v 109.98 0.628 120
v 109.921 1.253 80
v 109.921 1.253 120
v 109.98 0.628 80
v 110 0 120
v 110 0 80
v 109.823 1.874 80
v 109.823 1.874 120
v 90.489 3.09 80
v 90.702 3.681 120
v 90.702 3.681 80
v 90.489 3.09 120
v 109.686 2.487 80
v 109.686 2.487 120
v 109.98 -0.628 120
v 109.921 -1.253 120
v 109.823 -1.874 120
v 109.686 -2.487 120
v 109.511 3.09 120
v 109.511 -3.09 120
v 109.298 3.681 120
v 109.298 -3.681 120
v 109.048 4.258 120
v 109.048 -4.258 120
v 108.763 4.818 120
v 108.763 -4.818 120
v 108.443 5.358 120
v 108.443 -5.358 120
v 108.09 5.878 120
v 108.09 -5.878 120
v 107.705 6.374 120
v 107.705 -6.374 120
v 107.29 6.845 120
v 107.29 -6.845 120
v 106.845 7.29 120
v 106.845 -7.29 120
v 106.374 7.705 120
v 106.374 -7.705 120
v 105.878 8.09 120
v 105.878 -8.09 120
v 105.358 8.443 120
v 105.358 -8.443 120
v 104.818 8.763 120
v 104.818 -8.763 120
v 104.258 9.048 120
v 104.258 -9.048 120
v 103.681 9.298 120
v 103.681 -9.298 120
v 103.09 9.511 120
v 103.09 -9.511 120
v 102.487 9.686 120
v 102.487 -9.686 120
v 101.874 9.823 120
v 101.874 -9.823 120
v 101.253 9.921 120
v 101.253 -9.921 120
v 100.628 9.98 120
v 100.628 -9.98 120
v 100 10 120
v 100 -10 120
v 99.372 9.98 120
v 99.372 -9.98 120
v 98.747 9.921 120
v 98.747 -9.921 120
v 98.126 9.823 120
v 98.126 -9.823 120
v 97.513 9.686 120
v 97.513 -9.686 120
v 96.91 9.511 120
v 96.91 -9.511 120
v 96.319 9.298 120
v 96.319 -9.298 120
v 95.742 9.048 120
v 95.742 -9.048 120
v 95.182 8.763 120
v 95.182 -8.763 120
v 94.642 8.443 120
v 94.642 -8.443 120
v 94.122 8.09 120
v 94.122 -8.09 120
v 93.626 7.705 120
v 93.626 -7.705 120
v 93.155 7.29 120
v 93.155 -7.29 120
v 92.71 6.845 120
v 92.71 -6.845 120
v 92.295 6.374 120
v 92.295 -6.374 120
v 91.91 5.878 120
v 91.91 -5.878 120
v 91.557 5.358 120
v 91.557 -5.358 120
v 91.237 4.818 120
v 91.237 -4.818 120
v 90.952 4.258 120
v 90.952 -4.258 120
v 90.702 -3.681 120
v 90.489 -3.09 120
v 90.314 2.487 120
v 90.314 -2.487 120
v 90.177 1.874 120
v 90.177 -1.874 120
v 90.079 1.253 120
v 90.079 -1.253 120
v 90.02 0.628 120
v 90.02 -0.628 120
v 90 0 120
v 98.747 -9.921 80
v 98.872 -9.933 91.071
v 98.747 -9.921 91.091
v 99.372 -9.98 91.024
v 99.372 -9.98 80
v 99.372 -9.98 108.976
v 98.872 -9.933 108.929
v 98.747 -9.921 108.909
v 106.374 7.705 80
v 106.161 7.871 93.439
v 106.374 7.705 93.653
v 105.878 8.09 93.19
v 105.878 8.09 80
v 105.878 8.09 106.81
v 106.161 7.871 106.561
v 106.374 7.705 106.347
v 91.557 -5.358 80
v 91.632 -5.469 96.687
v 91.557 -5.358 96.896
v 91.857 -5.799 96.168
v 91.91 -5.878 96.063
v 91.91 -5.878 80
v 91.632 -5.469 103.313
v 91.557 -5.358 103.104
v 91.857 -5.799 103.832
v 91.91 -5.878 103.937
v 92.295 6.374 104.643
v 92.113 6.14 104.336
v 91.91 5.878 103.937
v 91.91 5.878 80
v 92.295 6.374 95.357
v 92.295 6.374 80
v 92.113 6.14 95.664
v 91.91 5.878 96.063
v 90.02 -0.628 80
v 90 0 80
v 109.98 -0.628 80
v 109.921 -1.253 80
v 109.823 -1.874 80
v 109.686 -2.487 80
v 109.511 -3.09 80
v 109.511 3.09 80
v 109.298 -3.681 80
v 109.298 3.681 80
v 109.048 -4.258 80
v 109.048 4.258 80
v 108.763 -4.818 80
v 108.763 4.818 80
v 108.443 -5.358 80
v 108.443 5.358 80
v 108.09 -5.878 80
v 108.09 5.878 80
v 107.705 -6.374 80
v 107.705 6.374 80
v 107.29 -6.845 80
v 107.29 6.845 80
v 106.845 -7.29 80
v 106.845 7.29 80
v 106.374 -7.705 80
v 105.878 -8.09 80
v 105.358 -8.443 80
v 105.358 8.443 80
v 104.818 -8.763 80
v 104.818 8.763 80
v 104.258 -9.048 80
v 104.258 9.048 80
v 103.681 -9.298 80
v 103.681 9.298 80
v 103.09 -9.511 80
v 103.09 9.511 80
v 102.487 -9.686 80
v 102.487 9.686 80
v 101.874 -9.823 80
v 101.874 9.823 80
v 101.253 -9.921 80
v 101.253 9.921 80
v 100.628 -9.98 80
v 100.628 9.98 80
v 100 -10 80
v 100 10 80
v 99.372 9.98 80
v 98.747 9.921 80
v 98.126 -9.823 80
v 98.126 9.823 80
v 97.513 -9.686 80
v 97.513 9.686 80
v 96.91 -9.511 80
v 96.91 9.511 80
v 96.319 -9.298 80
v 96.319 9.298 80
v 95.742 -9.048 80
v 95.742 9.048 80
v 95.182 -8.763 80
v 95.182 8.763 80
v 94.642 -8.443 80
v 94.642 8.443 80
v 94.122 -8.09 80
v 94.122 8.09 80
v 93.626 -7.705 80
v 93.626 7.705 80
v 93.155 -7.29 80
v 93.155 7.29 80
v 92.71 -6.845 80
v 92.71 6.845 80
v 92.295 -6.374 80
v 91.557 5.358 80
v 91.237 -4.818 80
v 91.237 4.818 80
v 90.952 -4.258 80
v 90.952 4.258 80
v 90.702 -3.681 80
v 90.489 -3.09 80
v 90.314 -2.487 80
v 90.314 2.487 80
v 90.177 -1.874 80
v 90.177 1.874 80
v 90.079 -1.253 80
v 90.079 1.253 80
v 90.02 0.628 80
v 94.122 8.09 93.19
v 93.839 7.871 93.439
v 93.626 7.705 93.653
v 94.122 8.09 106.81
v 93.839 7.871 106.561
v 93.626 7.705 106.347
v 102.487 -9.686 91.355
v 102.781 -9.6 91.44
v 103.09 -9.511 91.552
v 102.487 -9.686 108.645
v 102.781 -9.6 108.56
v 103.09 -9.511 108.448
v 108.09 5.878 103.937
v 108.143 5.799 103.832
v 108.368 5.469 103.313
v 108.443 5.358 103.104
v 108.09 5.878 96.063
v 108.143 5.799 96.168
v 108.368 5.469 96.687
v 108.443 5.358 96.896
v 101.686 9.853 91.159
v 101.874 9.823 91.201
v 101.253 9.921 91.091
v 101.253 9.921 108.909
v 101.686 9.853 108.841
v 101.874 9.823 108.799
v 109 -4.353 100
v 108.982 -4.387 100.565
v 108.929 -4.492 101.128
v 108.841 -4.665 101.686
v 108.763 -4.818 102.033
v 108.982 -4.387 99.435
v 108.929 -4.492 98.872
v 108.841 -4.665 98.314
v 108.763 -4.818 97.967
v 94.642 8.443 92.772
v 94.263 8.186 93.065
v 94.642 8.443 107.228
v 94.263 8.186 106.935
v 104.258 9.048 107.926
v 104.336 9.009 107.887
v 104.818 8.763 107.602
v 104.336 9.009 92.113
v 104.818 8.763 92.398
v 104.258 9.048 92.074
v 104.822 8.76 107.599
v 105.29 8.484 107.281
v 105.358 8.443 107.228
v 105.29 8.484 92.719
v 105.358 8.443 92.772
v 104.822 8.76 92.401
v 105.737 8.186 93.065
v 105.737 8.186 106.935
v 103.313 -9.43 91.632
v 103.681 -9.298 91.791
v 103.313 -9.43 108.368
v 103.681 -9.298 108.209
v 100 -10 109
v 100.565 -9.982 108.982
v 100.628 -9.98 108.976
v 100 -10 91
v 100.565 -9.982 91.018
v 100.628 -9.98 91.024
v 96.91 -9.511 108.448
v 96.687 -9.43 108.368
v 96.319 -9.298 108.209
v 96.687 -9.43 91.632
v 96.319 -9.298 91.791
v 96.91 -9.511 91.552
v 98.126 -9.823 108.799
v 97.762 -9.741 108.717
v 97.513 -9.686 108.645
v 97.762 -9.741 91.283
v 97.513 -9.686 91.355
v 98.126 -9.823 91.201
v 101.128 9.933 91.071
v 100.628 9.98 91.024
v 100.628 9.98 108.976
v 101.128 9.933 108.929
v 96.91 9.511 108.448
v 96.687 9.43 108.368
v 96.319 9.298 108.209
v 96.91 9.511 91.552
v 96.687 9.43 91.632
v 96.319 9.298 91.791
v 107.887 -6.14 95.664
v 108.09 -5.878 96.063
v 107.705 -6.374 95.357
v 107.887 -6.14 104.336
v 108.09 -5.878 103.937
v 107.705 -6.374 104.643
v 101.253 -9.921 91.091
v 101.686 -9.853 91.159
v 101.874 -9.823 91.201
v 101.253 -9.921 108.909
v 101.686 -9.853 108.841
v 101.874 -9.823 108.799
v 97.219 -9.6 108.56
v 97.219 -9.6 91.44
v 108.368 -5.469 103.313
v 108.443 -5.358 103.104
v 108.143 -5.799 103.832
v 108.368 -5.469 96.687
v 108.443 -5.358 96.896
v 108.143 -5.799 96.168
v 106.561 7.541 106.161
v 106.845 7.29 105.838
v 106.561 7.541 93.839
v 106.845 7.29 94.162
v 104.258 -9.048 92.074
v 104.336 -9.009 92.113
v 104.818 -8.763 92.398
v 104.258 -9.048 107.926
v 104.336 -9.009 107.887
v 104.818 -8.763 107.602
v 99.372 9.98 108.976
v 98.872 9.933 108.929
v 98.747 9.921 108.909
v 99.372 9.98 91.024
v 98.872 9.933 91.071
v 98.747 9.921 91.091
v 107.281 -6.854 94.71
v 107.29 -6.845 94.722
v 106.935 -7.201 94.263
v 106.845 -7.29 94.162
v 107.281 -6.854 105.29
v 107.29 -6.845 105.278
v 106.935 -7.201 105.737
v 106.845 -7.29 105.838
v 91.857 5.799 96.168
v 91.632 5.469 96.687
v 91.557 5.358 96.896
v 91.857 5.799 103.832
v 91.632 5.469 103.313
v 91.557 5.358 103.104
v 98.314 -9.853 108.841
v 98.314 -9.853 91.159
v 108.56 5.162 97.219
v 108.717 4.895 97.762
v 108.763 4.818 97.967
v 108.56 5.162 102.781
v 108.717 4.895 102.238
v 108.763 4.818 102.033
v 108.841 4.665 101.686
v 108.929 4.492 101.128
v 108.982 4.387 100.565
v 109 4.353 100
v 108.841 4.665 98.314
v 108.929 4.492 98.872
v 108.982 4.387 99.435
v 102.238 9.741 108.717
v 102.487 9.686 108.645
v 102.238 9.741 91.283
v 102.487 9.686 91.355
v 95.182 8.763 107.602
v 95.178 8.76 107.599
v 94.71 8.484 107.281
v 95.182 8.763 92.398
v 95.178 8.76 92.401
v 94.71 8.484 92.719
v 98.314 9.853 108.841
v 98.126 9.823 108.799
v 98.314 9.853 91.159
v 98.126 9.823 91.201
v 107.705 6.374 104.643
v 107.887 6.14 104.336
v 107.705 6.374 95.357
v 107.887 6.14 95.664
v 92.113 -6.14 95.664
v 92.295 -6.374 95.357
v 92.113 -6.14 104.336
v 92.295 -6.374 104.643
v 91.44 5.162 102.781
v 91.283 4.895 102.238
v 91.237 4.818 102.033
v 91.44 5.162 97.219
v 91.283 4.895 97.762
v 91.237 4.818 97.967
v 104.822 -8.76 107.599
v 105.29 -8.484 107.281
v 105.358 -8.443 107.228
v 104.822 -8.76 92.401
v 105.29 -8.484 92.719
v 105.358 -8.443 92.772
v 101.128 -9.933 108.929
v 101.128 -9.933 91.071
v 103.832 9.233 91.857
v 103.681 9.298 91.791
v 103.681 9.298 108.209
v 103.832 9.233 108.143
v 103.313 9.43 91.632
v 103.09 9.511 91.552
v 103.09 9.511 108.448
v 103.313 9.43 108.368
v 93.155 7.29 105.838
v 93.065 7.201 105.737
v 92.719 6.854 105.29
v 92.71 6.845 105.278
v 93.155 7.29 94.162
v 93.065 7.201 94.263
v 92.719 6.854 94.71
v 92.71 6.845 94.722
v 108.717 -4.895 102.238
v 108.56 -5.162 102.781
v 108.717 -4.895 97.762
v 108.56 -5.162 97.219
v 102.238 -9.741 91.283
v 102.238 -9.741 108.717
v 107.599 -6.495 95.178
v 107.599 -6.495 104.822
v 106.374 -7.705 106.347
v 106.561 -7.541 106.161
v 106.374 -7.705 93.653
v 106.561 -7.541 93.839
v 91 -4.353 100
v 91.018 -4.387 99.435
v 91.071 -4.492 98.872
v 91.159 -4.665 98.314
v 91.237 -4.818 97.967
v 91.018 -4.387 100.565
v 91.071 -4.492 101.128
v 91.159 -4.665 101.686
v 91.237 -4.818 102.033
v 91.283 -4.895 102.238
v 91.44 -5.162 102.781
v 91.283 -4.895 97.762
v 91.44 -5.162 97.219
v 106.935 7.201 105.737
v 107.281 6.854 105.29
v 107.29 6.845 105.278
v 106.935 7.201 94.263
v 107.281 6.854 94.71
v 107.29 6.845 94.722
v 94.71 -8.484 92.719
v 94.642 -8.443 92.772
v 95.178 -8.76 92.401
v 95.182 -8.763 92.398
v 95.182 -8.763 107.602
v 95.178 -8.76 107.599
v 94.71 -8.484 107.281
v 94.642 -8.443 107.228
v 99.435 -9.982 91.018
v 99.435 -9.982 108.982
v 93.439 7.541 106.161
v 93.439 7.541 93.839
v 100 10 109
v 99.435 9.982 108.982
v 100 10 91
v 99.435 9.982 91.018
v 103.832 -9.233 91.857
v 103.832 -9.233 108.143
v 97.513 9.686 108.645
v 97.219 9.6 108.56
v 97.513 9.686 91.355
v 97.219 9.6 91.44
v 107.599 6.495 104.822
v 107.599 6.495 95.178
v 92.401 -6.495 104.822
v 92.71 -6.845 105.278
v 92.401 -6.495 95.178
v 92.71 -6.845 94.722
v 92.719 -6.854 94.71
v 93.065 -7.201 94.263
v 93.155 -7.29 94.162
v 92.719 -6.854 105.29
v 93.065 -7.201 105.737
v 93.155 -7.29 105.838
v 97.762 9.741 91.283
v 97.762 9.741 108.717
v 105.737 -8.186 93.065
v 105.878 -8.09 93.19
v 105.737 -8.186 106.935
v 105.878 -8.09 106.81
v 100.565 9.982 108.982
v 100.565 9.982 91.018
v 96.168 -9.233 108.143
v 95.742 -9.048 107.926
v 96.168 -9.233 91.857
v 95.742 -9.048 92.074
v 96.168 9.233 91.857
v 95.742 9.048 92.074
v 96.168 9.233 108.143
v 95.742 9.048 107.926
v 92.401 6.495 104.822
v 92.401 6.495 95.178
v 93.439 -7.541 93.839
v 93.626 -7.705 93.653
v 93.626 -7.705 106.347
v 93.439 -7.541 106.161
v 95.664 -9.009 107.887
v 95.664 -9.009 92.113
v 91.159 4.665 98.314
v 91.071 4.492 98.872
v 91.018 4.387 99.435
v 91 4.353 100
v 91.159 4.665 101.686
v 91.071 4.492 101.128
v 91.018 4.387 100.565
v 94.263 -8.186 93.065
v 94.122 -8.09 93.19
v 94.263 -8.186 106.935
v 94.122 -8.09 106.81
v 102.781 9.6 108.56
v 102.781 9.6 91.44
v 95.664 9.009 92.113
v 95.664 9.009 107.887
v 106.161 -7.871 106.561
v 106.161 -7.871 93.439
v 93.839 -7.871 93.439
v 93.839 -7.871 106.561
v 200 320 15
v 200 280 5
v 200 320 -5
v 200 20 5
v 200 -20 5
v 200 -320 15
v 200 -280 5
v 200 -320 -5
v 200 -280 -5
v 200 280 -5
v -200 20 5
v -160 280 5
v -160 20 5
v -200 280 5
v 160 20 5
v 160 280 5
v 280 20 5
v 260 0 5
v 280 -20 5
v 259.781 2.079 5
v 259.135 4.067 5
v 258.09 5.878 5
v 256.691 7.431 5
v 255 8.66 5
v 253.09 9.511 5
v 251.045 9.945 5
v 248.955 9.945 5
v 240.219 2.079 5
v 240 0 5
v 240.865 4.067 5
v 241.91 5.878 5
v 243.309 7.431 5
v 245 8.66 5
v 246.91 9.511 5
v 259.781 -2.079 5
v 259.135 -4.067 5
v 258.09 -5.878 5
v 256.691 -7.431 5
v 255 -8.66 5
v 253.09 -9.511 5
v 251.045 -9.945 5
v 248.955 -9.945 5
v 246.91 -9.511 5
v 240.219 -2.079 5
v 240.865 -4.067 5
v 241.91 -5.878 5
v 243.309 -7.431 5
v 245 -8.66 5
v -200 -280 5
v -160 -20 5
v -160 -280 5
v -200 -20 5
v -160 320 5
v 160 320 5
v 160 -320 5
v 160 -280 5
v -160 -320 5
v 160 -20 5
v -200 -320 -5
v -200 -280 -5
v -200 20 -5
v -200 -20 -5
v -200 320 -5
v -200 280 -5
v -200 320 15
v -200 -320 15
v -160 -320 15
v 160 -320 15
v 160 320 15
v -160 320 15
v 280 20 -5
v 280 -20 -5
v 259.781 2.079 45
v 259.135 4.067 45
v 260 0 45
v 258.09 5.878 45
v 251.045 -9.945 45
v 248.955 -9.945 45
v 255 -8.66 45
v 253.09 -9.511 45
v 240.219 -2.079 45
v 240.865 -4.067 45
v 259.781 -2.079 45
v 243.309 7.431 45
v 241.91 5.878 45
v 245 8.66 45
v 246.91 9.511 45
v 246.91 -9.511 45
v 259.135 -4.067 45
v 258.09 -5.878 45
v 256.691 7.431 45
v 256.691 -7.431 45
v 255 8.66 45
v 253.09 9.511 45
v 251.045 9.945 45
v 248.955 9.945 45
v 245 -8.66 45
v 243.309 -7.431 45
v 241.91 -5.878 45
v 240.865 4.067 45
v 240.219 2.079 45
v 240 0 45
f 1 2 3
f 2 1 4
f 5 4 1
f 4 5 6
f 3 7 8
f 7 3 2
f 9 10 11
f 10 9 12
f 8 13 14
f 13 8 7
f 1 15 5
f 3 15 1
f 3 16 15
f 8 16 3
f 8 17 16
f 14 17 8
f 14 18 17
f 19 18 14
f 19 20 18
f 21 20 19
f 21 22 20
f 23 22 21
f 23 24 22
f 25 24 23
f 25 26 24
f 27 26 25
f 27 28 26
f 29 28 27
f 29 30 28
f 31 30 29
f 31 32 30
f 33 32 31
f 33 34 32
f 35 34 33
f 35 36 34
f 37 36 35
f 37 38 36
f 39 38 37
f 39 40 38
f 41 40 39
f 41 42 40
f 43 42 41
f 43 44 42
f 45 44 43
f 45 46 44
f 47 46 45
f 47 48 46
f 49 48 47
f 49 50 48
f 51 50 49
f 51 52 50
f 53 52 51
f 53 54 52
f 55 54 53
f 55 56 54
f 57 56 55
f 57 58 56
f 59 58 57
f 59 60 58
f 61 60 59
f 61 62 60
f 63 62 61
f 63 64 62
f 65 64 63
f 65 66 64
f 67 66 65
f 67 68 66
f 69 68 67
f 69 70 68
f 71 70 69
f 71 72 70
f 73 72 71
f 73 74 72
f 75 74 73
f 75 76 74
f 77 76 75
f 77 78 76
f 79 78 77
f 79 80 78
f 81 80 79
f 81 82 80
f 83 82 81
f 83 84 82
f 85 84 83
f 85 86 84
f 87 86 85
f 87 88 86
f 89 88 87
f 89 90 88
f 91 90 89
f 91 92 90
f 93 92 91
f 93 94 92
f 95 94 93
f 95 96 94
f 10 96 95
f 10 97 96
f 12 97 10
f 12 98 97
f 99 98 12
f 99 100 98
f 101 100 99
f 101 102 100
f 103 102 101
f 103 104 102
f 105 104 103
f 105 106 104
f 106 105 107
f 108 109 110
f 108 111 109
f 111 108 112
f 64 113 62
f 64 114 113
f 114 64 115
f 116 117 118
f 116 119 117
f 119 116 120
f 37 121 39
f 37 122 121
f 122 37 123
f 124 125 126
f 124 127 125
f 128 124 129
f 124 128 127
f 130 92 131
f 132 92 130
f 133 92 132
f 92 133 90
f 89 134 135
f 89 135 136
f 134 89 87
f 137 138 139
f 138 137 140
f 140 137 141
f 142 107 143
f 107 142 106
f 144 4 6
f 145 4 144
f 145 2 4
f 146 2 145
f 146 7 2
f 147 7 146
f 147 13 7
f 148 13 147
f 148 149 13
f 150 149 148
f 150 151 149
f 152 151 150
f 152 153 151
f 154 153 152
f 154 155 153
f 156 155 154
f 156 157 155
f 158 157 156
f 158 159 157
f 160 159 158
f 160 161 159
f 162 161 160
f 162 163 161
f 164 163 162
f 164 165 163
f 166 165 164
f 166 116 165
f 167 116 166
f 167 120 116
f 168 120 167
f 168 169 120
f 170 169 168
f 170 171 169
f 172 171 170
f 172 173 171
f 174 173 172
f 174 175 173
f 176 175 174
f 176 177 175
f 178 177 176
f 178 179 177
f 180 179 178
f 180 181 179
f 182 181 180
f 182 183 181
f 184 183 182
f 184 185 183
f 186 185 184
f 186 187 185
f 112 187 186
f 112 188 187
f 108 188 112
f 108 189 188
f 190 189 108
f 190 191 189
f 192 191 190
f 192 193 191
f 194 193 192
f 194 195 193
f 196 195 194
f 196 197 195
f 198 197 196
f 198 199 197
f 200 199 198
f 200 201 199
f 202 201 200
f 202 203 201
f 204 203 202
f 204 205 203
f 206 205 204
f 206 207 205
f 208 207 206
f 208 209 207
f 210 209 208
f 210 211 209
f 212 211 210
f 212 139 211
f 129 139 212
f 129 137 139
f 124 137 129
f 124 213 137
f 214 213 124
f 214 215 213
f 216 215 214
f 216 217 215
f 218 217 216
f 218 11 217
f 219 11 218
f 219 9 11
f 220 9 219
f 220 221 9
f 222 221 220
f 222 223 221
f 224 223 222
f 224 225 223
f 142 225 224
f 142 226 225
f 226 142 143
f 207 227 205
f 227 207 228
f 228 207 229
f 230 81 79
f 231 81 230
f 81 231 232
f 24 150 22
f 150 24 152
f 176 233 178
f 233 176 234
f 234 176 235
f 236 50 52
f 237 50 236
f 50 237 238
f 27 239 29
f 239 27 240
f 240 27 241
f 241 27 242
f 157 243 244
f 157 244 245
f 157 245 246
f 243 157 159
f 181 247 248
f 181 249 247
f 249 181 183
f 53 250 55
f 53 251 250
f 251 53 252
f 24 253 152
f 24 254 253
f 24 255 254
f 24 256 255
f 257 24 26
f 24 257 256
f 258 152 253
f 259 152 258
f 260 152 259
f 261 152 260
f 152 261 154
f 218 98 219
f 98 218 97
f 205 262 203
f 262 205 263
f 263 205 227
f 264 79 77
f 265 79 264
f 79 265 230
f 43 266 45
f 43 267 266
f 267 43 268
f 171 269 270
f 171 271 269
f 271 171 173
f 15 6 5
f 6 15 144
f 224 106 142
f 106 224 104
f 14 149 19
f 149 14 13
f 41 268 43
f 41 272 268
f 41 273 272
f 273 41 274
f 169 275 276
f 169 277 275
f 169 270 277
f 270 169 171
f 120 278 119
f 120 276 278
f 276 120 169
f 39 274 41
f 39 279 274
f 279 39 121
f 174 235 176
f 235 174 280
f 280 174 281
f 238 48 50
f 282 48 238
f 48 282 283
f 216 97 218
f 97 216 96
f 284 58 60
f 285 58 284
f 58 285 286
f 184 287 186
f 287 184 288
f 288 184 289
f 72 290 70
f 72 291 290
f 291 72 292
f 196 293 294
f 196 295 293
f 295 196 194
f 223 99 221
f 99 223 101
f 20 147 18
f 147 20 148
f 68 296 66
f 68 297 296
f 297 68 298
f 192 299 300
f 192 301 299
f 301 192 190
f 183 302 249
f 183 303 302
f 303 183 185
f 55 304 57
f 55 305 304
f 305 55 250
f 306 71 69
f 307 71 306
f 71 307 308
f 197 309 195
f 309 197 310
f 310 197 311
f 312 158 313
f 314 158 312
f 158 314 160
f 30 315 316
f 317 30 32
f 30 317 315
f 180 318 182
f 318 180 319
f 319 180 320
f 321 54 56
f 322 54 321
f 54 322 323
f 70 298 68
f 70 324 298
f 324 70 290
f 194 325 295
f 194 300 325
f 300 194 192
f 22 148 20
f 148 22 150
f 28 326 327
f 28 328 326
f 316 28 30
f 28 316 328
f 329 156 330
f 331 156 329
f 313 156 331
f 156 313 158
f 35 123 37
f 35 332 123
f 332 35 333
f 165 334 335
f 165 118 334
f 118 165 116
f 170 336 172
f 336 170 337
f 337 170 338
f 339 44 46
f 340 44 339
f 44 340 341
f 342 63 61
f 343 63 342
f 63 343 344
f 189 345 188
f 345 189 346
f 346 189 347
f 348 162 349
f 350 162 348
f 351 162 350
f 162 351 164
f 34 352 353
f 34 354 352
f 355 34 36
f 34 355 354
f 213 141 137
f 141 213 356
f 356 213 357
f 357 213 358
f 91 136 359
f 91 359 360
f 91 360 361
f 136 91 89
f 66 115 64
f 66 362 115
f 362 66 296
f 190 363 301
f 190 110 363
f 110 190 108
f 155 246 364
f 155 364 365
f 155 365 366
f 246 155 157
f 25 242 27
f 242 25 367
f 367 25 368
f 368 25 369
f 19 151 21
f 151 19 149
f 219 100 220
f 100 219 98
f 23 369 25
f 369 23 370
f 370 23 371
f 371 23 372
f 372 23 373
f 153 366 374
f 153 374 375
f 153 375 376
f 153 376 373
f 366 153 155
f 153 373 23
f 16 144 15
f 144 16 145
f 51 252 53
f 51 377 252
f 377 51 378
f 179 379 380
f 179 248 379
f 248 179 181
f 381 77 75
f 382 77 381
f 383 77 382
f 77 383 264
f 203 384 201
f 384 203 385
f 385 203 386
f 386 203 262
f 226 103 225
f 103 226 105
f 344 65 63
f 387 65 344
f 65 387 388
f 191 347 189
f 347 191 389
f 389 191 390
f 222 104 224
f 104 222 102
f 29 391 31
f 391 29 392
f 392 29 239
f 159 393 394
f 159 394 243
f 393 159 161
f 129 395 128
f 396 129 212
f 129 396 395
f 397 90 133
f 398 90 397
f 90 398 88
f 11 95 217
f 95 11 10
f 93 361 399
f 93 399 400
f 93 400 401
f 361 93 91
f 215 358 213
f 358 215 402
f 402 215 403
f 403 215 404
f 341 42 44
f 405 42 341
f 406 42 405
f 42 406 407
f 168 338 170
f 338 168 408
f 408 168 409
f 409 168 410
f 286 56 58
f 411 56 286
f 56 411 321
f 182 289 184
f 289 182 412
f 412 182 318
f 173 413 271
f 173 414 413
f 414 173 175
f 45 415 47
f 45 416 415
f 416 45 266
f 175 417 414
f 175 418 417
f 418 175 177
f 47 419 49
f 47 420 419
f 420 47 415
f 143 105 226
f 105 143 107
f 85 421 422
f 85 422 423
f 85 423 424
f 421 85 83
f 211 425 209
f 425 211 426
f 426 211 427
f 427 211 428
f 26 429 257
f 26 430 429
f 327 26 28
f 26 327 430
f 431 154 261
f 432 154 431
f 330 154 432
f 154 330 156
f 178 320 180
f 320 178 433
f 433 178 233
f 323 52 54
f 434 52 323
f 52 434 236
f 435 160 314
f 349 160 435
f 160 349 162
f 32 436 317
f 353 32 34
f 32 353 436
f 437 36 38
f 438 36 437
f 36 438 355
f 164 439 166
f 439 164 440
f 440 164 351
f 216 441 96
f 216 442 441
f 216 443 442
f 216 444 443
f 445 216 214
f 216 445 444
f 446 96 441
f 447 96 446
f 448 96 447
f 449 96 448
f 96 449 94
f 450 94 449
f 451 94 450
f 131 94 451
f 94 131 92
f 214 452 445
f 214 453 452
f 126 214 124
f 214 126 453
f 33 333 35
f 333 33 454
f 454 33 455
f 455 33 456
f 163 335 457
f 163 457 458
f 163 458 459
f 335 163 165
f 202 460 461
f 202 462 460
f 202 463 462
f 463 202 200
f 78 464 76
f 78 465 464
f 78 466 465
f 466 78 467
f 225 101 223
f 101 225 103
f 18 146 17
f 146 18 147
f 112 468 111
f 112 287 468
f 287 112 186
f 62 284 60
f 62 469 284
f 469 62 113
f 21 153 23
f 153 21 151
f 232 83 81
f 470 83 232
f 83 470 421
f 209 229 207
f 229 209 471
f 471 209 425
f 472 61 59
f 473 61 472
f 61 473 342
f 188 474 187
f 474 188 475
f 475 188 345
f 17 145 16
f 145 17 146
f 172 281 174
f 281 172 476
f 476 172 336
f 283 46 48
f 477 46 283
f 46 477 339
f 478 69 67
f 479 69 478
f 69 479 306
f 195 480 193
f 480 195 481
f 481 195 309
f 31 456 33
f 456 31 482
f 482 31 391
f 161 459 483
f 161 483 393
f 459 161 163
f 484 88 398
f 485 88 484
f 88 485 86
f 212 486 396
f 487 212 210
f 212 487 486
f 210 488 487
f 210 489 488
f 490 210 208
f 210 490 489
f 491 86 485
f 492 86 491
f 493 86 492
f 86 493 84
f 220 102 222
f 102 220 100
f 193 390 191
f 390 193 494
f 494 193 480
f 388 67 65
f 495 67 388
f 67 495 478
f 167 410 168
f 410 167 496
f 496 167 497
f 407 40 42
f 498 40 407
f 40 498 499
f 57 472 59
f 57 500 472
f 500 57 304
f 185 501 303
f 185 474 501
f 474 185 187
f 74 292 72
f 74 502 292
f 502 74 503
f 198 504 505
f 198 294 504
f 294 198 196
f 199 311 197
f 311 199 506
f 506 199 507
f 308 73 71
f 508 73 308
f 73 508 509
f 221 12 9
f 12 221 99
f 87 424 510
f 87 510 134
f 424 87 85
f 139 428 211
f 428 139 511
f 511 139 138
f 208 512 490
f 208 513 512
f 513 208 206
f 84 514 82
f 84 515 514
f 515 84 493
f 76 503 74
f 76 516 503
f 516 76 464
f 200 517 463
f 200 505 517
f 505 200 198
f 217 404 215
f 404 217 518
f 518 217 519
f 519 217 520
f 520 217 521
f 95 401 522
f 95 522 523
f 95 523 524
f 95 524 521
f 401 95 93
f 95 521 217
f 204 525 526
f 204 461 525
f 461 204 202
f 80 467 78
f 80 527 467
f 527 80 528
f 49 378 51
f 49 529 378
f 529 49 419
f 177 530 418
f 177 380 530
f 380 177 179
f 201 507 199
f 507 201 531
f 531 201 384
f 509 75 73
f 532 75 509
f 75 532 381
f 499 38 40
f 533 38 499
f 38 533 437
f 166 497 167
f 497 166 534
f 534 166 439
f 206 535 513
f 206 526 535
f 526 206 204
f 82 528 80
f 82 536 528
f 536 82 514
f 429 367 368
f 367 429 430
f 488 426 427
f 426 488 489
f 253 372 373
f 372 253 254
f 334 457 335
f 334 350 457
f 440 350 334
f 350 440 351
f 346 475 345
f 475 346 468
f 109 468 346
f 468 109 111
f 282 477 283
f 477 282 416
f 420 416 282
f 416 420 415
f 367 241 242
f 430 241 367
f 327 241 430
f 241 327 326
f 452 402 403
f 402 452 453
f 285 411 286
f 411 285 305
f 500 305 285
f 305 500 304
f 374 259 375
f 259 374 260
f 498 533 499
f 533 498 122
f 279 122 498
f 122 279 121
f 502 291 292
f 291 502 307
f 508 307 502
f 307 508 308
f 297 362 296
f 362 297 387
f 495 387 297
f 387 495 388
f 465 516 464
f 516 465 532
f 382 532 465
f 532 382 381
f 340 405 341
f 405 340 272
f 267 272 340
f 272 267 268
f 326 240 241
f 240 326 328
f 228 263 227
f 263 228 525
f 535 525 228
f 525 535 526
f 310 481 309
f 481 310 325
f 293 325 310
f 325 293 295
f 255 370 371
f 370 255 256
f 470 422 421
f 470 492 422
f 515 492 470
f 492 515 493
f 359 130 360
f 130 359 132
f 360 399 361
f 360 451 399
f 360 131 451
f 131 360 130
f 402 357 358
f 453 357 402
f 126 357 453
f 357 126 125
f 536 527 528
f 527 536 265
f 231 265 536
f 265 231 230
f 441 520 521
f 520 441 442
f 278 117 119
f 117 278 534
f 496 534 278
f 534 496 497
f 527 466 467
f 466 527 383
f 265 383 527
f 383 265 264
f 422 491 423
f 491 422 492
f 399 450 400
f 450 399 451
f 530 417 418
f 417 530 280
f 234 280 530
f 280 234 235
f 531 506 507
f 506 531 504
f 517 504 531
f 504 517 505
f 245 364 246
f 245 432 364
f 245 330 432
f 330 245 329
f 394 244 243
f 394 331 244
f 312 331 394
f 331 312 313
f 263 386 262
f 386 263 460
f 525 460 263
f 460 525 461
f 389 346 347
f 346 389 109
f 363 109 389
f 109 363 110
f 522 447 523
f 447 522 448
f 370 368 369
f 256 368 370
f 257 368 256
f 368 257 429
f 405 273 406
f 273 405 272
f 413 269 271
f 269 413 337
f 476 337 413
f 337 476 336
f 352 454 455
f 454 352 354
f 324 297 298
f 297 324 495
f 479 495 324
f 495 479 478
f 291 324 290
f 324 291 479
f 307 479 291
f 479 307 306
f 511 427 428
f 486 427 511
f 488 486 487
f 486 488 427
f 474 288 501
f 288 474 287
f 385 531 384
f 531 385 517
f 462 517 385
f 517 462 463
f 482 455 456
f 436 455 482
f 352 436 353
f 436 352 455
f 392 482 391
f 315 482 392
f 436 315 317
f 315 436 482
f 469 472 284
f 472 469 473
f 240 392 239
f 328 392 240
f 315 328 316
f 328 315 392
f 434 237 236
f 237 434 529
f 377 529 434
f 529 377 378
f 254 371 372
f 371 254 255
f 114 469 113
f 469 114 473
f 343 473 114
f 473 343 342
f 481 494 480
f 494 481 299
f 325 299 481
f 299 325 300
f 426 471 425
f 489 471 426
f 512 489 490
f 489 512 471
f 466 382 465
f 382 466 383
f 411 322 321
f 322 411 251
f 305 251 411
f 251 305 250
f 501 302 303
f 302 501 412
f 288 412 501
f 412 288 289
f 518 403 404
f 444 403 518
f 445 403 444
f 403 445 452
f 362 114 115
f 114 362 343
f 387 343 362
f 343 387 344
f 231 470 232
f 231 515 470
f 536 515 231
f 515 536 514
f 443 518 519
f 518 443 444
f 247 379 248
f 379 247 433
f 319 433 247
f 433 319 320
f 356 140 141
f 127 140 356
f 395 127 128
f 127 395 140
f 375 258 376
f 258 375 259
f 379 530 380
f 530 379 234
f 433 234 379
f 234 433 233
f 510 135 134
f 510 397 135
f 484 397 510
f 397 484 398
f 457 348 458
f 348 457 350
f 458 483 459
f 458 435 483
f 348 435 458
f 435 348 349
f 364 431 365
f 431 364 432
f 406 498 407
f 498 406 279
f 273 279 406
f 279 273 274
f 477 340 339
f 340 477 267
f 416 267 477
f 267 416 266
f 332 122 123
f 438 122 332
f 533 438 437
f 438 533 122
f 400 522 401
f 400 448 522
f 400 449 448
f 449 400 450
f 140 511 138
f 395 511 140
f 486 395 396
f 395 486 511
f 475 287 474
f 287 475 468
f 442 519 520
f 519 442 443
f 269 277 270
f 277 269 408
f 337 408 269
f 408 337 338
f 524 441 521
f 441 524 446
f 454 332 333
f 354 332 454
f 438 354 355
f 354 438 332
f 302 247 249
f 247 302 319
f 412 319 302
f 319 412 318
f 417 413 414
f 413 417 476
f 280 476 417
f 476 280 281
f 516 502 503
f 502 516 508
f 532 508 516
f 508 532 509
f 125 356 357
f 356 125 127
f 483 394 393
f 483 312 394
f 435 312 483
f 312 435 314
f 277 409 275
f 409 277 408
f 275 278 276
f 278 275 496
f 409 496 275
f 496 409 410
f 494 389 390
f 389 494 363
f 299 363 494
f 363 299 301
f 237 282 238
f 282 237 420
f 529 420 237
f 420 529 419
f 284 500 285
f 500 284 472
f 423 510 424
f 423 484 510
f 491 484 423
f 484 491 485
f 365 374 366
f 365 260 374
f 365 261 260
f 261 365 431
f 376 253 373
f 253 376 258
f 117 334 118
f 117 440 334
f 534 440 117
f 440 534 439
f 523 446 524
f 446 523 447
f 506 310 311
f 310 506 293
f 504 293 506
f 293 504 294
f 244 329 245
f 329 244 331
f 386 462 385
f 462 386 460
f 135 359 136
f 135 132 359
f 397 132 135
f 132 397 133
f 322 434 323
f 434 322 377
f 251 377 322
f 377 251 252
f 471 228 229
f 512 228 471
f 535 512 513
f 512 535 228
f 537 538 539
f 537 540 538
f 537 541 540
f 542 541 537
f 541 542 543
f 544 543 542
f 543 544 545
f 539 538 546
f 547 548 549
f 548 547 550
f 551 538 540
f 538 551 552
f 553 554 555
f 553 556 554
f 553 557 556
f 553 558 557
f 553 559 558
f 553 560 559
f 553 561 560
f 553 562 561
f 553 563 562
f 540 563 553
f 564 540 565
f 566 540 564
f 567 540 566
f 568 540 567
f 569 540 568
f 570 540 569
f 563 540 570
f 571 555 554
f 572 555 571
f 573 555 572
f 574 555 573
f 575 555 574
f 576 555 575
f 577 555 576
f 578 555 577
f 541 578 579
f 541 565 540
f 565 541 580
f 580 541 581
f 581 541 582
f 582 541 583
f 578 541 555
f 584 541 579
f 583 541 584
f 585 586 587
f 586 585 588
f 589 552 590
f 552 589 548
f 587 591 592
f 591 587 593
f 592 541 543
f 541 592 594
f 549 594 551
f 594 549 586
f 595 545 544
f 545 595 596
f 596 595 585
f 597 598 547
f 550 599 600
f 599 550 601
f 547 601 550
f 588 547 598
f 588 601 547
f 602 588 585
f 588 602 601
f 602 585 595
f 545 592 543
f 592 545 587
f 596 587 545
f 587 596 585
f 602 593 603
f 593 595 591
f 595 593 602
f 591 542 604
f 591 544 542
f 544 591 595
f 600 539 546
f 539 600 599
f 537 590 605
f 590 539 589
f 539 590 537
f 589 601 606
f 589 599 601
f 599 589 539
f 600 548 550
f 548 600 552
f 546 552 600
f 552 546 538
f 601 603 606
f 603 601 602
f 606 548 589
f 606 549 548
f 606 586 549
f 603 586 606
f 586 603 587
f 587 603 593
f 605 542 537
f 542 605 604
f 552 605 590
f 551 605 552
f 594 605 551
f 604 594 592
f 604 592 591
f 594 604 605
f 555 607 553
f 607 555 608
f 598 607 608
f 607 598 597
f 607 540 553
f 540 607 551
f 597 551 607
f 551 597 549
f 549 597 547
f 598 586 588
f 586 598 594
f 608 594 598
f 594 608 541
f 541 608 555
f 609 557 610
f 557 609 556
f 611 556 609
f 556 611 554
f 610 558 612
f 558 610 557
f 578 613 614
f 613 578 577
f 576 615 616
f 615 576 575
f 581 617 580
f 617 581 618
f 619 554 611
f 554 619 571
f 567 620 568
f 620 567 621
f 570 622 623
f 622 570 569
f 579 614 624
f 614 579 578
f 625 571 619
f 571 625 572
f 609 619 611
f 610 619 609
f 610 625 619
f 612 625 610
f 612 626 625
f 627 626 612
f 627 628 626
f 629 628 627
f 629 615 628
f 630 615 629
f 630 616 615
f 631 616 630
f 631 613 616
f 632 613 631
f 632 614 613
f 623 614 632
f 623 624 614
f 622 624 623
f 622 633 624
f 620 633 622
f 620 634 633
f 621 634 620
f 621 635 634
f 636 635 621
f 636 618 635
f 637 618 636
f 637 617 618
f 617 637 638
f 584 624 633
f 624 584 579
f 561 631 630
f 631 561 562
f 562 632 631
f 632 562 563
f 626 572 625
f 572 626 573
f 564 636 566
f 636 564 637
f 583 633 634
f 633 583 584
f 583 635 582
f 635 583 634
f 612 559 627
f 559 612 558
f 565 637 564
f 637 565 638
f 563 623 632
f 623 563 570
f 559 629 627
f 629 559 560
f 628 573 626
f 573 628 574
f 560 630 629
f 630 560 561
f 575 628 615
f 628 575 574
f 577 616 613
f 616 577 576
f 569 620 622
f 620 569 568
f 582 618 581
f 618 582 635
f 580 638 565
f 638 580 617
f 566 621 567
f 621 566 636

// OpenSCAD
x1=400; //width front back
x2=x1*1.6; //width sides 160
x3=x1*1.2; //length steer 120
x4=x1*0.2; // 20


y1=x1/10; //depth
z1=x1/40; //thickness



module plank(x,y,z) {
color("SaddleBrown"){
  cube(size=[x, y, z], center=true);
}
}

module axis(r1,r2,h1){
  cylinder(r1,r2,h1, center=true);
}

module holder(x,y,z){
  color("SaddleBrown"){
  cube(size=[x,y,z], center=true);
}
}

//plank achter
translate([0, (-x2+y1)/2, 0]) {

  plank(x1,y1,z1);

}

//plank voor
translate([0, (x2-y1)/2, 0]) {
  plank(x1,y1,z1);
}

//plank links
translate([(-x1+y1)/2, 0, z1]) {
  rotate([0, 0, 90]) {

    plank(x2,y1,z1);
  }
}
//plank rechts
translate([(x1-y1)/2, 0, z1]) {
  rotate([0, 0, 90]) {
    plank(x2,y1,z1);
  }
}

//stuur
translate([(x3-x1)/2, 0, 0]) {

  plank(x3,y1,z1);
}

//handvat
translate([(x3/2)+z1, 0, (y1+z1)/2]) {
  r1=y1;
  r2=z1;
  h1=z1;
axis(r1,r2,h1);
}

translate([100, 0, 100]) {

difference() {
	cylinder (h = 40, r=10, center = true, $fn=100);
	rotate ([90,0,0]) cylinder (h = 40, r=9, center = true, $fn=100);
}
}
